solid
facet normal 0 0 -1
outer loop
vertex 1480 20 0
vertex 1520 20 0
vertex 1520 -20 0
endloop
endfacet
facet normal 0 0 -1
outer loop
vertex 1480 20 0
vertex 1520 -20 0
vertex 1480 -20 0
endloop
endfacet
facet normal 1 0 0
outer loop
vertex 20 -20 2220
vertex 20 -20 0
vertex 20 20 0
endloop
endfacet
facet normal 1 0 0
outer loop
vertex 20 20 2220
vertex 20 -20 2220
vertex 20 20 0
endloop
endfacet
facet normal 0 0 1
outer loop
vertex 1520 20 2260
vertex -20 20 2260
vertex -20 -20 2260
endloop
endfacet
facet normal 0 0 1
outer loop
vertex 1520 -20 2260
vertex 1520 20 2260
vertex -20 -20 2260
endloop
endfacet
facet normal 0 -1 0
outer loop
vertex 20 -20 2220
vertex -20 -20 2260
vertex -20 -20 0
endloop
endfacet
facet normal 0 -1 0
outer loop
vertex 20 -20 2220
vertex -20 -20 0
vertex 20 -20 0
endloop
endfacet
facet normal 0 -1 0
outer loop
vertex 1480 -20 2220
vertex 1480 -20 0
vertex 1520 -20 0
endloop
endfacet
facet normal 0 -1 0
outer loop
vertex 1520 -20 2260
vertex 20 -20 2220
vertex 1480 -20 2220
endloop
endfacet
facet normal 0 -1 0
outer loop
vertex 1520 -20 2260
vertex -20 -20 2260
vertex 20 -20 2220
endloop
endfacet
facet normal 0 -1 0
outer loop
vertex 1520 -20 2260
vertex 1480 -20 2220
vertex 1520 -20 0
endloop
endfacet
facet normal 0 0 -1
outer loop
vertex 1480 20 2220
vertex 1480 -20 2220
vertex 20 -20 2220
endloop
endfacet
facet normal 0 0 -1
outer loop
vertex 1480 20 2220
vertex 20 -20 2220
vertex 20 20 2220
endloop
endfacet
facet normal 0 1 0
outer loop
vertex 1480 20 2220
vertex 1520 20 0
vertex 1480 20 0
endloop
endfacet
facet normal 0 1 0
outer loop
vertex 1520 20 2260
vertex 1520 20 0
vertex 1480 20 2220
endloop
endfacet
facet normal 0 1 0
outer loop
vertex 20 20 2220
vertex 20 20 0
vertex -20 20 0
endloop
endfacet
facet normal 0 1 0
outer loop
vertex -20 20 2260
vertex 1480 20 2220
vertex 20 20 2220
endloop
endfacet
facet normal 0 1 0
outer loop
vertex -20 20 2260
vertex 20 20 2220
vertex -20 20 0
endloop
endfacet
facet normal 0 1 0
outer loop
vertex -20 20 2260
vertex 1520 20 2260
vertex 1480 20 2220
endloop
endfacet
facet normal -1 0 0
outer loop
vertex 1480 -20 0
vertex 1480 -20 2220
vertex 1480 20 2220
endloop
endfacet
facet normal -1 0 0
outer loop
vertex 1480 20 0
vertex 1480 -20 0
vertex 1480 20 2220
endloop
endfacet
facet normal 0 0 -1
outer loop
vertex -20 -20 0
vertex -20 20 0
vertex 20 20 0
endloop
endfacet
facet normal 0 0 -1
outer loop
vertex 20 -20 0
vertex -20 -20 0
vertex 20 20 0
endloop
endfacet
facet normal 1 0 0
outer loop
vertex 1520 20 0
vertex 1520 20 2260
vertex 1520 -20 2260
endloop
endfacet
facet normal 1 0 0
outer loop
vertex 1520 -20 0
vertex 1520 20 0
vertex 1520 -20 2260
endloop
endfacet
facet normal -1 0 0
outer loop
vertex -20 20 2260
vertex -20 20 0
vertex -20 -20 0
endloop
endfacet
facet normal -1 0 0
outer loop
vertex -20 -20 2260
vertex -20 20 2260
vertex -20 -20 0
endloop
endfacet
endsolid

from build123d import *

# Parameters (mm, degrees)
F0_W = 40
F0_H = 40


with BuildPart() as f2:
    # F2: sweep along a path in F1
    with BuildLine(Plane.XZ) as f2_path:
        Line((0, 0), (0, 2240))
        Line((0, 2240), (1500, 2240))
        Line((1500, 2240), (1500, 0))
    # F0 (on Top) → F2 (sweep)
    with BuildSketch(Plane.XY):
        Rectangle(F0_W, F0_H)
    sweep(path=f2_path.line, transition=Transition.RIGHT)


solid = f2.part
